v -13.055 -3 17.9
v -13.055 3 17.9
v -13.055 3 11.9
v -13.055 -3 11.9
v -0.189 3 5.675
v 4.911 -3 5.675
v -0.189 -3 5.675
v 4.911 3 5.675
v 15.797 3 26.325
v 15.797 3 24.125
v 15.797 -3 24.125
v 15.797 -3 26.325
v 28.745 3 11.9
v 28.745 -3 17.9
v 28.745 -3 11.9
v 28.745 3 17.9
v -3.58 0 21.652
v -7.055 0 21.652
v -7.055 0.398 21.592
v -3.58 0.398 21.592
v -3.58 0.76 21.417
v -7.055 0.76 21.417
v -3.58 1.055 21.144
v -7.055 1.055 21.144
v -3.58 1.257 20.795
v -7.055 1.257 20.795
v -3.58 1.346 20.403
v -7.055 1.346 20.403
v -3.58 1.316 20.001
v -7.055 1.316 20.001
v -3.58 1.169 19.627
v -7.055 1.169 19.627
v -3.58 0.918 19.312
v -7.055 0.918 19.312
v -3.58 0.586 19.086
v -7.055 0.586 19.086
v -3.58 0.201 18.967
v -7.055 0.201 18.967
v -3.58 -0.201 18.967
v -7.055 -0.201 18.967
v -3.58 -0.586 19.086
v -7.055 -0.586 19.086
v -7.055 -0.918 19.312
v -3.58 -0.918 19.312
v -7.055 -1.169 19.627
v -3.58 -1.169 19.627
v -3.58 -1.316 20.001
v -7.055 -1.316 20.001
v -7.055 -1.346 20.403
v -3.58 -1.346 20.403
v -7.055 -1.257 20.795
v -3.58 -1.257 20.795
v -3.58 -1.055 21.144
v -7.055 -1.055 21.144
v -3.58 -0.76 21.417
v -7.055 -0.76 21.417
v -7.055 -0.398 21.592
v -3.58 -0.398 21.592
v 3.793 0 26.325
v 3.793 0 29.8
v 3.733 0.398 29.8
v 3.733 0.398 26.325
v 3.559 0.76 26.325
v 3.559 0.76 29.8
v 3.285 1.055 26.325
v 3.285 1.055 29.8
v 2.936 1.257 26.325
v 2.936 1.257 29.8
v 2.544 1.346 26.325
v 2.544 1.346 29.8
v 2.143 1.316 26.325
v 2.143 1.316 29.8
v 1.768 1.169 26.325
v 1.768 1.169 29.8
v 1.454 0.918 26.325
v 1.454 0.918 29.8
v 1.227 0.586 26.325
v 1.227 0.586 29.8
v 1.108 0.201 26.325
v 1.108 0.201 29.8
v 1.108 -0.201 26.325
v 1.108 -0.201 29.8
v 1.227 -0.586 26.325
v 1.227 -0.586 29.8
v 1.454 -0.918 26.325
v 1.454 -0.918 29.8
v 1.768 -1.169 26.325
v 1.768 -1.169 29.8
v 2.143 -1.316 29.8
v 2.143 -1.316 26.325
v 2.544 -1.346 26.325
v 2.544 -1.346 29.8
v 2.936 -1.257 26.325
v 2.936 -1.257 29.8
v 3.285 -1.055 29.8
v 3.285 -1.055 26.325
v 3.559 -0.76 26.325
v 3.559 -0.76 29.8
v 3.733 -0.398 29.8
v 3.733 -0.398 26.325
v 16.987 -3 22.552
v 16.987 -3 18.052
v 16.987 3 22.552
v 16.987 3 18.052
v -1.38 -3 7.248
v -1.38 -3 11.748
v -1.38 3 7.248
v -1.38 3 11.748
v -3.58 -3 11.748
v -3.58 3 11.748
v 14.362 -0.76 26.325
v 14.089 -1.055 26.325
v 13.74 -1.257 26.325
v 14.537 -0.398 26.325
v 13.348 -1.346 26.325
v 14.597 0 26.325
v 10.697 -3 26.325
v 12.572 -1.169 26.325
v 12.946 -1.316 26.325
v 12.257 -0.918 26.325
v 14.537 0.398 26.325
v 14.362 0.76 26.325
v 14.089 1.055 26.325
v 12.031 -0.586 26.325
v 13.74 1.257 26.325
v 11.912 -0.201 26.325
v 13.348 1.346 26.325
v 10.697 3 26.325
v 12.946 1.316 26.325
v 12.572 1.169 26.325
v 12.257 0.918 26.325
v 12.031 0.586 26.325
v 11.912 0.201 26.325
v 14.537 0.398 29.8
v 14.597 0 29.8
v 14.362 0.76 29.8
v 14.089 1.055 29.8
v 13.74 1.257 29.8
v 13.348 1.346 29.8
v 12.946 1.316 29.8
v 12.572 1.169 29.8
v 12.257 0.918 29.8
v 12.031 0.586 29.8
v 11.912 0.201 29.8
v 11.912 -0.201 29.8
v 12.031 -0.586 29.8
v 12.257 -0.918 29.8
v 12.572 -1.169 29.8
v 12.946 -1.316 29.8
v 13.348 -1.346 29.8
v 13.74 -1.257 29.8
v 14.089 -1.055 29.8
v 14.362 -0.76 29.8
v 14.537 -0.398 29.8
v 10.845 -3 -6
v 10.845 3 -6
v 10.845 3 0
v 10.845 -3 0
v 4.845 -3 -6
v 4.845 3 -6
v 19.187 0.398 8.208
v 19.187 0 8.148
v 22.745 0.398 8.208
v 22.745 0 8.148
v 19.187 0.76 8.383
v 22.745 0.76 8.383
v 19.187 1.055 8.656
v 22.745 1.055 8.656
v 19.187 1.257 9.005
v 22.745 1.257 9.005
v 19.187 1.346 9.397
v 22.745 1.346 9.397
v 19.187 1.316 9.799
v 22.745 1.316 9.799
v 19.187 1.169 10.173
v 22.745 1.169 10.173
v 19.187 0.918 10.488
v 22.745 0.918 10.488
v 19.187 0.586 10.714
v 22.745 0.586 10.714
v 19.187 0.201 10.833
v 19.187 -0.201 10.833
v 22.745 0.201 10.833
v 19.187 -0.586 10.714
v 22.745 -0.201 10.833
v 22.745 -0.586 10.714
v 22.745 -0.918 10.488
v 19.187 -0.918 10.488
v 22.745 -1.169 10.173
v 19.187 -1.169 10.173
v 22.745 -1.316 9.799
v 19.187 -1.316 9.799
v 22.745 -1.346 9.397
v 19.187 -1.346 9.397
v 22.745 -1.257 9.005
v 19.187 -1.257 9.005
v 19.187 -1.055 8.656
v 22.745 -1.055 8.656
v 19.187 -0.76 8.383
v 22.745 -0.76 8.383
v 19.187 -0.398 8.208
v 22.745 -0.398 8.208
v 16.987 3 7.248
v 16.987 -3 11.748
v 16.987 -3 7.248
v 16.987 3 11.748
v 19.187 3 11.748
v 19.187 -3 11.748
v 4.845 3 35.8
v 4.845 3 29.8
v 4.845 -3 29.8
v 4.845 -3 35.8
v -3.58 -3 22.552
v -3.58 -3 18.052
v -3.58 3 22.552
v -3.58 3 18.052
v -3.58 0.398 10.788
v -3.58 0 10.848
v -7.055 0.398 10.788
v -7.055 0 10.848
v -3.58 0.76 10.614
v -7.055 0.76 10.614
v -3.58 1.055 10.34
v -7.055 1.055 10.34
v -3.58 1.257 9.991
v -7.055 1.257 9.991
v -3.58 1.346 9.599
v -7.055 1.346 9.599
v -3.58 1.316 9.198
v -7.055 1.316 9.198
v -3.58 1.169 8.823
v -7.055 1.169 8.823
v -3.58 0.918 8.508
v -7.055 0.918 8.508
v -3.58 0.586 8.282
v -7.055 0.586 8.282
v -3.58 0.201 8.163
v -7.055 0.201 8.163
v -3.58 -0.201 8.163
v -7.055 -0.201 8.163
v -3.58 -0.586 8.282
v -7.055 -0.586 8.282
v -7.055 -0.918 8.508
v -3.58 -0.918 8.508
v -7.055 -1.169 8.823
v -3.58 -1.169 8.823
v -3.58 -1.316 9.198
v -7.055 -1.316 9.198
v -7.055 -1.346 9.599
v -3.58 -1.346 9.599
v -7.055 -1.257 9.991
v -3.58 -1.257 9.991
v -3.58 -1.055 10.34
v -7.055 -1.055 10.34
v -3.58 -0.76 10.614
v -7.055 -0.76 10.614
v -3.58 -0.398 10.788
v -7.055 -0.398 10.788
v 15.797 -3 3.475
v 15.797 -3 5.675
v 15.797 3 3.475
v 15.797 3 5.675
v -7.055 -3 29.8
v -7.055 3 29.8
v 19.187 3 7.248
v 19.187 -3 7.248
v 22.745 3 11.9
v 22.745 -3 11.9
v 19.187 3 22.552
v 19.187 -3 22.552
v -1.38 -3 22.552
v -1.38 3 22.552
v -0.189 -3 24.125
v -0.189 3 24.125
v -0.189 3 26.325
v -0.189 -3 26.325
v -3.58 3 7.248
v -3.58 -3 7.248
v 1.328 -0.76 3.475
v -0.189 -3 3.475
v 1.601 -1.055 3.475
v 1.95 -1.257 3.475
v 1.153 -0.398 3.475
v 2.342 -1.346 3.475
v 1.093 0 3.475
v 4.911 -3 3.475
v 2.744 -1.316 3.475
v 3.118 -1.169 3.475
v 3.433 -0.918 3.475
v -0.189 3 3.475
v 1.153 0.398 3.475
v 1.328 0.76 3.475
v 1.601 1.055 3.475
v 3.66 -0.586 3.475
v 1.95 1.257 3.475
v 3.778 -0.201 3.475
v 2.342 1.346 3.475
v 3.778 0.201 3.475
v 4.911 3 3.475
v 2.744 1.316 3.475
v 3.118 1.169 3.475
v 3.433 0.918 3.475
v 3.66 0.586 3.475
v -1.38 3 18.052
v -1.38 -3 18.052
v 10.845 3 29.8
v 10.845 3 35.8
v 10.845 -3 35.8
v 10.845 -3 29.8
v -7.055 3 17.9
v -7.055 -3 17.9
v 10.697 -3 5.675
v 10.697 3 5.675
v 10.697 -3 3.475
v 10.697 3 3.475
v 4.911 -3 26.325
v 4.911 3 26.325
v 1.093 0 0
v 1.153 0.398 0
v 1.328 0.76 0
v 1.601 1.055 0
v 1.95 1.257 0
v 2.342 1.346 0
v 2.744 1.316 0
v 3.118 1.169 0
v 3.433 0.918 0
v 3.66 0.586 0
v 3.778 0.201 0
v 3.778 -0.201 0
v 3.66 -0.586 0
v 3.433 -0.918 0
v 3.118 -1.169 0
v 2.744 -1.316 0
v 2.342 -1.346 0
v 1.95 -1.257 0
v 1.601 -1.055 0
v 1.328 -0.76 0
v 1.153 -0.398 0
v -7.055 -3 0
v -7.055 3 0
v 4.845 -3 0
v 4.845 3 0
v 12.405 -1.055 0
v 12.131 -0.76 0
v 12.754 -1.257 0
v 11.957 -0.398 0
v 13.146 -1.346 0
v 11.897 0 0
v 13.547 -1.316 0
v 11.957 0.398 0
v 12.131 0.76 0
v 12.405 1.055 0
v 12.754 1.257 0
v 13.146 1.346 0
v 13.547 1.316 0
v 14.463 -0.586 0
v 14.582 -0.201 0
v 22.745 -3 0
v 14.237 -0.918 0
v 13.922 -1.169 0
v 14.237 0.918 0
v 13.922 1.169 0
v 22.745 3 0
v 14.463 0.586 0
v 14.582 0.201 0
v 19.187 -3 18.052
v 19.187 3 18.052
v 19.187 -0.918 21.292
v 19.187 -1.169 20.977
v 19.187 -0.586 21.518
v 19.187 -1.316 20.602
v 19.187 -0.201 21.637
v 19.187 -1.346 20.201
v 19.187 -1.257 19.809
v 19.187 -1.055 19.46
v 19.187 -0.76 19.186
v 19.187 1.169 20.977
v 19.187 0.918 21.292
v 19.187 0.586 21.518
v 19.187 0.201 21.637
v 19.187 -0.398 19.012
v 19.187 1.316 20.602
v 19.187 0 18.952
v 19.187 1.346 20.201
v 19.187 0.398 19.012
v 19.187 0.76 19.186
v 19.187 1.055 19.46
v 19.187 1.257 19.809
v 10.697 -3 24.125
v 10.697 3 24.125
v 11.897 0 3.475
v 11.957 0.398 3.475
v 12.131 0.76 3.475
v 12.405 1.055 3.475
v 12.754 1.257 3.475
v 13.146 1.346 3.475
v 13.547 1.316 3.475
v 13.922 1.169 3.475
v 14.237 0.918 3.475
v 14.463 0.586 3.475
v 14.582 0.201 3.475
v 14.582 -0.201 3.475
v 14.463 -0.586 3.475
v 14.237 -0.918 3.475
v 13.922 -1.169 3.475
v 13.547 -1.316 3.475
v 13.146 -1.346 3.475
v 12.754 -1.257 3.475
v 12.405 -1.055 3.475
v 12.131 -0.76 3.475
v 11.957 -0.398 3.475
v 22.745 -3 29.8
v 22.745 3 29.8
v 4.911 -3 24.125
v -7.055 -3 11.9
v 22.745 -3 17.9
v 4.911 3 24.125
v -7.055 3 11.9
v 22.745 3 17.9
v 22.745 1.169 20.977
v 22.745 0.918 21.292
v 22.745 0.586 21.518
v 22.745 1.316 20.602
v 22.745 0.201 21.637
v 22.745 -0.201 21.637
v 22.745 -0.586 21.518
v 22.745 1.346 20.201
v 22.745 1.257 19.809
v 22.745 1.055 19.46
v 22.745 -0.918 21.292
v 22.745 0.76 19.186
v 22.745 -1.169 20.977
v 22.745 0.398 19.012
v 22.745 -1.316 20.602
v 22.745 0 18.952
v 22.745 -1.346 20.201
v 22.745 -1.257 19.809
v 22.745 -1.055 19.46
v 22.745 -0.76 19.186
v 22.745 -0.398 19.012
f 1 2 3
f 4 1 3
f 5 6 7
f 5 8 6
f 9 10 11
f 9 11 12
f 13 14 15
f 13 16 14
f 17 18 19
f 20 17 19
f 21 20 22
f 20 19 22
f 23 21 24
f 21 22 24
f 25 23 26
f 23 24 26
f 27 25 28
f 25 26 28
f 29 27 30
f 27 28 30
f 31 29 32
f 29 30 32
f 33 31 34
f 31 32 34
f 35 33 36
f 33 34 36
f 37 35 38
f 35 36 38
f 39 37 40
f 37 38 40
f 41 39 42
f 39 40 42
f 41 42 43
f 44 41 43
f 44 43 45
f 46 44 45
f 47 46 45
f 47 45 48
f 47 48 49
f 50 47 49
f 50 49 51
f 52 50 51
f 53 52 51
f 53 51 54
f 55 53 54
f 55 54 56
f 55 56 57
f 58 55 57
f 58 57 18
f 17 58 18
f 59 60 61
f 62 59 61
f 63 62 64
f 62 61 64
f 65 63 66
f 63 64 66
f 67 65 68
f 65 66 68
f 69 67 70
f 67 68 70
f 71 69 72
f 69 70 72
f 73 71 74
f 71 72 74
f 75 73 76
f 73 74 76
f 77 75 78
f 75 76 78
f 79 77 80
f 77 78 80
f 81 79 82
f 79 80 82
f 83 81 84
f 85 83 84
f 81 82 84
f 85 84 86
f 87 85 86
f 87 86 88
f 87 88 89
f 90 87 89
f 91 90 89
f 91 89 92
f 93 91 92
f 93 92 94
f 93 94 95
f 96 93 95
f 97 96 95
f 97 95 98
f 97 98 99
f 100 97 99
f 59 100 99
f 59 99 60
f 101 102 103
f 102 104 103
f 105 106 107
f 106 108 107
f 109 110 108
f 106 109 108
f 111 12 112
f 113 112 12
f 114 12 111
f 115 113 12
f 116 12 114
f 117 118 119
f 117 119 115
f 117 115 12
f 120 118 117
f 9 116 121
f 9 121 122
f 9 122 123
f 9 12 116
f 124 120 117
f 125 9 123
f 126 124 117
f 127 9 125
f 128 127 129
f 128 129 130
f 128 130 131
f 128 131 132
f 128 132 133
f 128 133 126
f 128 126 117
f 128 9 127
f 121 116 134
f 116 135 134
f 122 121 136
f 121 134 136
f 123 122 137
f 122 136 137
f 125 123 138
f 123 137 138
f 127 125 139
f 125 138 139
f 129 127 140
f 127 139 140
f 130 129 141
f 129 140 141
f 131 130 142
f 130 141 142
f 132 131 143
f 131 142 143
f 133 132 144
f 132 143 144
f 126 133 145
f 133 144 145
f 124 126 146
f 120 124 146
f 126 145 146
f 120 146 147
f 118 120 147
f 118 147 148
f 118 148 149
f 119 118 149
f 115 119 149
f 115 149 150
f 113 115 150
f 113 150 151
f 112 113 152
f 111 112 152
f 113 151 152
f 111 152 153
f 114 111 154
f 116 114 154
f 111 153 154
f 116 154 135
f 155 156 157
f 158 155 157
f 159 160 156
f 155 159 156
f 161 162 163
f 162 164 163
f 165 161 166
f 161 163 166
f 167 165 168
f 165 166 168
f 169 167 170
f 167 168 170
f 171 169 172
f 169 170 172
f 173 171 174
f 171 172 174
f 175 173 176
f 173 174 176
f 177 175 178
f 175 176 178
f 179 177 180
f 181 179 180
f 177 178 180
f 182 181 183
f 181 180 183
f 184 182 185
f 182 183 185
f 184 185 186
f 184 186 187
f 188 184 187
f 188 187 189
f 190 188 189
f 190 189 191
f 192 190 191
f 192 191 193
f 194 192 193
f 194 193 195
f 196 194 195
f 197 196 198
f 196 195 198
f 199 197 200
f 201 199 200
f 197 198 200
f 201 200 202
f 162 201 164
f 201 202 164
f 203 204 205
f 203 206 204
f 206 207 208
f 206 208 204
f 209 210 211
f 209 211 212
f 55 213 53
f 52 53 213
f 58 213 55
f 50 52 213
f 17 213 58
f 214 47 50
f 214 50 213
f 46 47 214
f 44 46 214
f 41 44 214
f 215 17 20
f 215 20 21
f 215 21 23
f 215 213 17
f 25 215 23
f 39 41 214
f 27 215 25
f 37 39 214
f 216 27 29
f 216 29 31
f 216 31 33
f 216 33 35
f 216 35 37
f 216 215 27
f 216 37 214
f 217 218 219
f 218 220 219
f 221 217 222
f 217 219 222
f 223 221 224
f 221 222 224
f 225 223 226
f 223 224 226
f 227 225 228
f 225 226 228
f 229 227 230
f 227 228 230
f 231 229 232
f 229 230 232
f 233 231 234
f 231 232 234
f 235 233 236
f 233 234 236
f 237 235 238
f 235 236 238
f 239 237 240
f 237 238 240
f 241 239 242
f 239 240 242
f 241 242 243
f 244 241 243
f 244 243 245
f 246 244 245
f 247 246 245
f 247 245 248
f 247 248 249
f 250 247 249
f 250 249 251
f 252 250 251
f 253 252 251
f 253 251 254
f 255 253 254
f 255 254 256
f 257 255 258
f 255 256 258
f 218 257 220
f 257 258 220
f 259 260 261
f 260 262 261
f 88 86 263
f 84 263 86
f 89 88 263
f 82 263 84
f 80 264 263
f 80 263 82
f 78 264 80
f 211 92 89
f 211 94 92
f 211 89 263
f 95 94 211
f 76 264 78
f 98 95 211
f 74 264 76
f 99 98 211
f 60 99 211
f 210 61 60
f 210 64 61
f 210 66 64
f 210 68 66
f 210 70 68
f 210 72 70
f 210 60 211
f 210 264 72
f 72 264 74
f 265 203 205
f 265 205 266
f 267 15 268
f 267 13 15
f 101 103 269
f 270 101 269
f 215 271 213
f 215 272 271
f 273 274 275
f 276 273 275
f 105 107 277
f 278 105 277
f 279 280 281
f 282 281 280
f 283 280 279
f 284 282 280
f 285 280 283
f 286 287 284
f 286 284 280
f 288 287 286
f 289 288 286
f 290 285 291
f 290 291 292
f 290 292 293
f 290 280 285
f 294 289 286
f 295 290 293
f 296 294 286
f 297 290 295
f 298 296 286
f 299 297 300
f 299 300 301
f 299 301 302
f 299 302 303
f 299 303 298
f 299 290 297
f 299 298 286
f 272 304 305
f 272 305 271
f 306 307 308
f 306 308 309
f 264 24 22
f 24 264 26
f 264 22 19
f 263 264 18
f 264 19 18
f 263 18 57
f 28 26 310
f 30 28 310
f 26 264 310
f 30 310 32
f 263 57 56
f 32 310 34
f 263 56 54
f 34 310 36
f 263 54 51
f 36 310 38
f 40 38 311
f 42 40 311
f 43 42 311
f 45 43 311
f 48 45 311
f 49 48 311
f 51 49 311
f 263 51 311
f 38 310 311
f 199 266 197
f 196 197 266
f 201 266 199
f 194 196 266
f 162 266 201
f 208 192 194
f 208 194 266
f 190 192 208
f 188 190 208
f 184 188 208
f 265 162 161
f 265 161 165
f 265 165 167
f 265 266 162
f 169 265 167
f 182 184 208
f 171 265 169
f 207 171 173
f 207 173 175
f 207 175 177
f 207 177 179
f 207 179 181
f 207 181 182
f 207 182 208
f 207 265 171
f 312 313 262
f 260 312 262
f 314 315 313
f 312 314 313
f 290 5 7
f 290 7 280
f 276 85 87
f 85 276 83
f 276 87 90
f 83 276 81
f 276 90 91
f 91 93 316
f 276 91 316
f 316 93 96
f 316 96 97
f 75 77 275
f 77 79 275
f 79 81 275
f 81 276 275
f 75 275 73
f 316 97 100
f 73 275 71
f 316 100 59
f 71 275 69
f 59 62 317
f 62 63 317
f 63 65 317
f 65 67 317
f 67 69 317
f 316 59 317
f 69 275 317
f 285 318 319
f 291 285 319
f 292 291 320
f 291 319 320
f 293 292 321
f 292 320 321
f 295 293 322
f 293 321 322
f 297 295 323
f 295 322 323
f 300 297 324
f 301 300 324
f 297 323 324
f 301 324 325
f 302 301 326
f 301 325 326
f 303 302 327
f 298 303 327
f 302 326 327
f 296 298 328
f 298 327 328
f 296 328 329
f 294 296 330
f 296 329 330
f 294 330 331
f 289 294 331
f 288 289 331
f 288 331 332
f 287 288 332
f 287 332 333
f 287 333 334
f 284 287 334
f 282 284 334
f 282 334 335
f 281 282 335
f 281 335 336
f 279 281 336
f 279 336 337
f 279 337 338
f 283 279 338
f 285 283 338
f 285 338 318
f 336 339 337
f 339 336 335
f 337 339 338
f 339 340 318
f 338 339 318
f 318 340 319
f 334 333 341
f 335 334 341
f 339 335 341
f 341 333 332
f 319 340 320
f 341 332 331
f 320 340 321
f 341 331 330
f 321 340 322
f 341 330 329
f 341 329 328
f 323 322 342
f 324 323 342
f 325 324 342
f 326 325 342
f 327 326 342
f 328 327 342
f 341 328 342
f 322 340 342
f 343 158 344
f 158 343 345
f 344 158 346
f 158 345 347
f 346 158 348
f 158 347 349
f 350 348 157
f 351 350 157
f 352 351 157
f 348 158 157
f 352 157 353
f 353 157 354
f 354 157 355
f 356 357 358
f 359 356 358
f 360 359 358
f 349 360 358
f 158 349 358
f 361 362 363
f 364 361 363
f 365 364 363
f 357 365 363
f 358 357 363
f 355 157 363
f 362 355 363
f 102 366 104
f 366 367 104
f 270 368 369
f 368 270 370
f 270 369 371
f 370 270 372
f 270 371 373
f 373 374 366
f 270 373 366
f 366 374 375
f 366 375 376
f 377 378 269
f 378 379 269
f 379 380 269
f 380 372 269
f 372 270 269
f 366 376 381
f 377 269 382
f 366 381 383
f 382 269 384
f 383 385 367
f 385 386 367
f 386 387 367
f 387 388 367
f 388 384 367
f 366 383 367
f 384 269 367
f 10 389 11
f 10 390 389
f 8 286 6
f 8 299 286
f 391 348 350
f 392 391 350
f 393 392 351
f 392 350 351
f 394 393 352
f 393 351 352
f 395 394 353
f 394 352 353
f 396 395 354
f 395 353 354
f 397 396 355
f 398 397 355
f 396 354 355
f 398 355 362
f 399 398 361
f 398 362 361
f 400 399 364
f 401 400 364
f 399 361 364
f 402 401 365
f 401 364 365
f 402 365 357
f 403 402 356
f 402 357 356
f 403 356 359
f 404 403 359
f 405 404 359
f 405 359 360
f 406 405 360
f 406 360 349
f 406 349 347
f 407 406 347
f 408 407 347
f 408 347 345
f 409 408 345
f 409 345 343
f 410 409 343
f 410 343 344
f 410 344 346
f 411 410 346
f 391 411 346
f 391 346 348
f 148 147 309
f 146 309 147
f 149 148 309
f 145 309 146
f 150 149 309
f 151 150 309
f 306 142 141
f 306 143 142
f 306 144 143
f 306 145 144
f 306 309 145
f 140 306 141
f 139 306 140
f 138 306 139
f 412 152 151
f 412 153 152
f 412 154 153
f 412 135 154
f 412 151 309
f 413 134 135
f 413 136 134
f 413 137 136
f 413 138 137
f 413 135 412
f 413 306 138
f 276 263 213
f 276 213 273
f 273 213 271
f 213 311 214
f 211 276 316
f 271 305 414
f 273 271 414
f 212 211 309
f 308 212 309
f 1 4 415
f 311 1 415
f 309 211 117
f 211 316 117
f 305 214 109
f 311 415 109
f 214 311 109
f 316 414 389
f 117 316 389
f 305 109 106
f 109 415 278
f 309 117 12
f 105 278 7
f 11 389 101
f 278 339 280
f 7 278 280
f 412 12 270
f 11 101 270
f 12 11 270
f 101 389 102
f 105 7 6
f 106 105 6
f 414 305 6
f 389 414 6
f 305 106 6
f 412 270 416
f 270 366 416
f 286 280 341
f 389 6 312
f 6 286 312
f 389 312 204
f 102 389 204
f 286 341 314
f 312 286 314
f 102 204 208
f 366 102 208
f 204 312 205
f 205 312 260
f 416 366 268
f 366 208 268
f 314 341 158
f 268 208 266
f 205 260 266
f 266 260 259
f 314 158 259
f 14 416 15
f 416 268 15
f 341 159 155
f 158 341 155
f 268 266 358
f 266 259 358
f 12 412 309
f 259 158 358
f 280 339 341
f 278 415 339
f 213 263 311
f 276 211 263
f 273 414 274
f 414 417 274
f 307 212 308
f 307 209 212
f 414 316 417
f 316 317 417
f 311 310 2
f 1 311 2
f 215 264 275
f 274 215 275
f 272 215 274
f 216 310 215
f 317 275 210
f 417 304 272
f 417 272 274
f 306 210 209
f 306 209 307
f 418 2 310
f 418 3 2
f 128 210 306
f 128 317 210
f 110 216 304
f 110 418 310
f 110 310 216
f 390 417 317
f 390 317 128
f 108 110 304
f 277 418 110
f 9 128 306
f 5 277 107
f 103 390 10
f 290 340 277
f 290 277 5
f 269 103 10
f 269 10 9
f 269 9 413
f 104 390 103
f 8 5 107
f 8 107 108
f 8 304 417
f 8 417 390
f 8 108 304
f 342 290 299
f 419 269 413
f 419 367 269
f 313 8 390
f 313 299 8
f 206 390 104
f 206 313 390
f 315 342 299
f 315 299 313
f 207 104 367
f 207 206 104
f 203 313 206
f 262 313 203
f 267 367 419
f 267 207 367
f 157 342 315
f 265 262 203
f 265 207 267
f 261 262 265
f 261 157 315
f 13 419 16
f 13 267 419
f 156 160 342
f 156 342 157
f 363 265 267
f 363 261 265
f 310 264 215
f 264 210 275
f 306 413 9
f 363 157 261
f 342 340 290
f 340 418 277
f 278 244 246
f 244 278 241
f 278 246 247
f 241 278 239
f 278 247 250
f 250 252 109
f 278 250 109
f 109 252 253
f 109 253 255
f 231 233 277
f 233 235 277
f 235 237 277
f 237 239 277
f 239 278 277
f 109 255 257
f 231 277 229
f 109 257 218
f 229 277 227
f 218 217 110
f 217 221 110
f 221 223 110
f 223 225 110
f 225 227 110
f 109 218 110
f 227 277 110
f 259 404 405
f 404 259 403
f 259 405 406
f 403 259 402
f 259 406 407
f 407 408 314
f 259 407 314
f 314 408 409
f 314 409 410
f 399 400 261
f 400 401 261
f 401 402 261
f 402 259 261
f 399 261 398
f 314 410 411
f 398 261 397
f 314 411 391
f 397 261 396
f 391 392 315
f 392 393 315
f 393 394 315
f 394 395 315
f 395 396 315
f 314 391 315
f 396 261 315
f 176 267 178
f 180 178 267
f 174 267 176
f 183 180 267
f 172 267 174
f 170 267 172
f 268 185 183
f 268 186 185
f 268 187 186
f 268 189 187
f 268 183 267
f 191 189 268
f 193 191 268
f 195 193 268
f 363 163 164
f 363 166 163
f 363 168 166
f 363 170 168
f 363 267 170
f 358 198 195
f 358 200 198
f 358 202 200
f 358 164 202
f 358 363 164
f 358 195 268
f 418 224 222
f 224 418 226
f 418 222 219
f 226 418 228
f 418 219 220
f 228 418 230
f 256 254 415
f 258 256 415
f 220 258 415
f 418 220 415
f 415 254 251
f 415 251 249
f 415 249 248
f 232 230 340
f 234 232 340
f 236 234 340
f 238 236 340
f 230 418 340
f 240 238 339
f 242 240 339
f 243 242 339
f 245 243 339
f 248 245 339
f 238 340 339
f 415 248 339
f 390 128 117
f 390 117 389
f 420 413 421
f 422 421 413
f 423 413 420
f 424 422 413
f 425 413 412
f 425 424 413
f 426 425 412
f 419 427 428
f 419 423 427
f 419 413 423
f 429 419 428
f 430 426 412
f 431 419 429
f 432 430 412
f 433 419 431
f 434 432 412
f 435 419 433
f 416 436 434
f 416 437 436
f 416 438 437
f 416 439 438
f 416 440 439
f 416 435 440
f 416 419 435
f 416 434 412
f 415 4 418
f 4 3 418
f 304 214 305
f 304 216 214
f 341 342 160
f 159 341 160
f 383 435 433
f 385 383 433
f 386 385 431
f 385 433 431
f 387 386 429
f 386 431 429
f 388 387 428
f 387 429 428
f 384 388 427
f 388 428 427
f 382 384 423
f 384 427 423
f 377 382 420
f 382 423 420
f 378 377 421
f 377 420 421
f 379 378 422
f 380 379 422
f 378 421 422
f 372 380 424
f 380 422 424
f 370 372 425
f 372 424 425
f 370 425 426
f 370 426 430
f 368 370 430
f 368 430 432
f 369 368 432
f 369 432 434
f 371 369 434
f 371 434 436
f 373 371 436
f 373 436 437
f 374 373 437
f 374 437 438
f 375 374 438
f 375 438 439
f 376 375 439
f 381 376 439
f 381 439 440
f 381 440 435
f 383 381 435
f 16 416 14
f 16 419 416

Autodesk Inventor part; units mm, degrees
ref_plane "YZ Plane" through (0, 0, 0) normal (1, 0, 0) x (0, 1, 0)
ref_plane "XZ Plane" through (0, 0, 0) normal (0, 1, 0) x (-1, 0, 0)
sketch "스케치1" plane through (0, 0, 0) normal (0, 0, 1) x (1, 0, 0)
  arc A0 (-4.555, 20.4) -> (-1.5118, 17.2038) centre (-1.355, 20.4) ccw projected
  line L0 (-4.555, 20.4) -> (-4.555, 29.4) projected
  line L1 (-4.555, 29.4) -> (-9.955, 29.4) projected
  line L2 (-9.955, 29.4) -> (-9.955, 17.8) projected
  line L3 (-9.955, 17.8) -> (-4.855, 11.8) projected
  line L4 (-4.855, 11.8) -> (-4.7625, 11.8) projected
  line L5 (-4.7625, 11.8) -> (-4.7625, -3) projected
  line L6 (-4.7625, -3) -> (3.7037, -3) projected
  arc A1 (4.7037, -2) -> (3.7037, -3) centre (4.7037, -3) ccw projected
  line L7 (4.7037, -2) -> (4.7037, 2.1) projected
  arc A2 (5.6987, 3) -> (4.7037, 2.1) centre (4.7037, 3.1) ccw projected
  line L8 (5.6987, 3) -> (9.9088, 3) projected
  arc A3 (10.9037, 2.1) -> (9.9088, 3) centre (10.9037, 3.1) ccw projected
  line L9 (10.9037, 2.1) -> (10.9037, -2) projected
  arc A4 (11.9037, -3) -> (10.9037, -2) centre (10.9037, -3) ccw projected
  line L10 (11.9037, -3) -> (20.4525, -3) projected
  line L11 (20.4525, -3) -> (20.4525, 11.8) projected
  line L12 (20.4525, 11.8) -> (20.545, 11.8) projected
  line L13 (20.545, 11.8) -> (25.645, 17.8) projected
  line L14 (25.645, 17.8) -> (25.645, 29.4) projected
  line L15 (25.645, 29.4) -> (20.245, 29.4) projected
  line L16 (20.245, 29.4) -> (20.245, 20.4) projected
  arc A5 (17.2018, 17.2038) -> (20.245, 20.4) centre (17.045, 20.4) ccw projected
  line L17 (17.2018, 17.2038) -> (-1.5118, 17.2038) projected
  circle A6 centre (13.2469, 0) radius 1.35 projected
  circle A7 centre (2.4432, 0) radius 1.35 projected
  circle A8 centre (18.0506, 0) radius 1.35 projected
  circle A9 centre (-2.3606, 0) radius 1.35 projected
  circle A10 centre (-7.155, 20.9) radius 1.35 projected
  circle A11 centre (-0.655, 14.6) radius 1.35 projected
  circle A12 centre (16.345, 14.6) radius 1.35 projected
  circle A13 centre (22.845, 20.9) radius 1.35 projected
  line L18 (20.4525, -3) -> (-4.855, -3)
  line L19 (-4.855, -3) -> (-4.855, 3)
  line L20 (-4.855, 3) -> (20.4525, 3)
  line L21 (20.4525, 3) -> (20.4525, -3)
  line L22 (22.845, 3) -> (22.845, -11.8) projected
  line L23 (-7.155, 3) -> (-7.155, -11.8) projected
  line L24 (22.745, 3) -> (22.745, -11.8)
  line L25 (-7.055, 3) -> (-7.055, -11.8)
  line L26 (22.745, -3) -> (-7.055, -3)
  line L27 (-7.055, -3) -> (-7.055, 3)
  line L28 (-7.055, 3) -> (22.745, 3)
  line L29 (22.745, 3) -> (22.745, -3)
  point P0 (0, 0)
  point P1 (11.8625, -3)
  point P2 (20.4525, 3)
  point P3 (9.8675, 3)
  point P4 (5.6574, 3)
  point P5 (-4.7625, 3)
  point P6 (3.6625, -3)
  point P7 (-4.855, 3)
  point P8 (-7.055, -3)
  point P9 (-4.855, -3)
  point P10 (-4.7625, -3)
  point P11 (22.745, 1.2049)
  point P12 (20.4525, 3)
  point P13 (20.4525, -3)
  point P14 (11.8987, 3)
  point P15 (3.7037, -3)
  point P16 (11.9037, -3)
  point P17 (5.6987, 3)
  point P18 (3.7088, 3)
  point P19 (5.6987, 3)
  point P20 (11.9037, -3)
  point P21 (-4.7625, 3)
  point P22 (-4.855, -3)
  point P23 (10.9037, -1.792)
  point P24 (-4.7625, -3)
  point P25 (4.7037, -1.792)
  dimension "d7" = 0.1
  dimension "d8" = 0.1
extrude "돌출1" add sketch "스케치1" along normal blind 29.8 contours L20 A2 L7 A1 L6 L5 | L5 L18 L19 L20 | L19 L26 L25 L28 | L20 L8 A3 L9 A4 L18 A1 L7 A2 | L28 L24 L26 L11 | L11 L10 A4 L9 A3 L20 | A6 | A7 | A8 | A9
ref_plane "작업 평면4" through (10.8037, 3, 0) normal (0, 1, 0) x (1, 0, 0)
sketch "스케치5" plane through (10.8037, 3, 0) normal (0, 1, 0) x (1, 0, 0)
  line L0 (1.1931, -3.675) -> (1.1931, 6)
  line L1 (3.6931, -3.675) -> (3.6931, 6)
  line L2 (1.1931, -5.675) -> (3.6931, -5.675)
  line L3 (2.4431, 0) -> (2.4431, -3.675)
  line L4 (2.4431, -5.675) -> (2.4431, -4.575)
  line L5 (2.4431, -4.575) -> (2.4431, -3.475)
  line L6 (2.4431, -3.475) -> (-0.1069, -3.475)
  line L7 (2.4431, -3.475) -> (4.9931, -3.475)
  line L8 (4.9931, -3.475) -> (-0.1069, -3.475)
  line L9 (-0.1069, -3.475) -> (-0.1069, -5.675)
  line L10 (-0.1069, -5.675) -> (4.9931, -5.675)
  line L11 (4.9931, -5.675) -> (4.9931, -3.475)
  line L12 (1.1931, -5.675) -> (1.1931, 6)
  line L13 (3.6931, -5.675) -> (3.6931, 6)
  line L14 (1.1931, -5.675) -> (3.6931, -5.675)
  line L15 (2.4431, -3.675) -> (2.4431, -5.675)
  line L16 (-23.9, -14.9) -> (17.9, -14.9)
  line L17 (1.1931, -24.125) -> (3.6931, -24.125)
  line L18 (2.4431, -24.125) -> (2.4431, -25.225)
  line L19 (2.4431, -25.225) -> (2.4431, -26.325)
  line L20 (2.4431, -26.325) -> (-0.1069, -26.325)
  line L21 (2.4431, -26.325) -> (4.9931, -26.325)
  line L22 (4.9931, -26.325) -> (-0.1069, -26.325)
  line L23 (-0.1069, -26.325) -> (-0.1069, -24.125)
  line L24 (-0.1069, -24.125) -> (4.9931, -24.125)
  line L25 (4.9931, -24.125) -> (4.9931, -26.325)
  line L26 (1.1931, -24.125) -> (3.6931, -24.125)
  line L27 (2.4431, -26.125) -> (2.4431, -24.125)
  line L28 (-3, -14.9) -> (-3, -22)
  line L29 (-7.1931, -5.675) -> (-9.6931, -5.675)
  line L30 (-8.4431, -5.675) -> (-8.4431, -4.575)
  line L31 (-8.4431, -4.575) -> (-8.4431, -3.475)
  line L32 (-8.4431, -3.475) -> (-5.8931, -3.475)
  line L33 (-8.4431, -3.475) -> (-10.9931, -3.475)
  line L34 (-10.9931, -3.475) -> (-5.8931, -3.475)
  line L35 (-5.8931, -3.475) -> (-5.8931, -5.675)
  line L36 (-5.8931, -5.675) -> (-10.9931, -5.675)
  line L37 (-10.9931, -5.675) -> (-10.9931, -3.475)
  line L38 (-7.1931, -5.675) -> (-9.6931, -5.675)
  line L39 (-8.4431, -3.675) -> (-8.4431, -5.675)
  line L40 (-7.1931, -24.125) -> (-9.6931, -24.125)
  line L41 (-8.4431, -24.125) -> (-8.4431, -25.225)
  line L42 (-8.4431, -25.225) -> (-8.4431, -26.325)
  line L43 (-7.1931, -24.125) -> (-9.6931, -24.125)
  line L44 (-8.4431, -26.125) -> (-8.4431, -24.125)
  line L45 (-8.4431, -26.325) -> (-10.9931, -26.325)
  line L46 (-10.9931, -24.125) -> (-10.9931, -26.325)
  line L47 (-8.4431, -26.325) -> (-5.8931, -26.325)
  line L48 (-5.8931, -26.325) -> (-5.8931, -24.125)
  line L49 (-10.9931, -26.325) -> (-5.8931, -26.325)
  line L50 (-5.8931, -24.125) -> (-10.9931, -24.125)
  line L51 (-12.1837, -21.5519) -> (-23.8587, -21.5519)
  line L52 (-12.1837, -19.0519) -> (-23.8587, -19.0519)
  line L53 (-12.1837, -19.0519) -> (-12.1837, -21.5519)
  line L54 (-12.1837, -19.0519) -> (-14.3837, -19.0519)
  line L55 (-12.1837, -20.3019) -> (-12.1837, -18.0519)
  line L56 (-12.1837, -20.3019) -> (-12.1837, -22.5519)
  line L57 (-14.3837, -18.0519) -> (-12.1837, -18.0519)
  line L58 (-12.1837, -18.0519) -> (-12.1837, -22.5519)
  line L59 (-12.1837, -22.5519) -> (-14.3837, -22.5519)
  line L60 (-14.3837, -22.5519) -> (-14.3837, -18.0519)
  line L61 (-12.1837, -10.7481) -> (-12.1837, -8.2481)
  line L62 (-12.1837, -10.7481) -> (-14.3837, -10.7481)
  line L63 (-12.1837, -9.4981) -> (-12.1837, -11.7481)
  line L64 (-12.1837, -9.4981) -> (-12.1837, -7.2481)
  line L65 (-14.3837, -11.7481) -> (-12.1837, -11.7481)
  line L66 (-12.1837, -11.7481) -> (-12.1837, -7.2481)
  line L67 (-12.1837, -7.2481) -> (-14.3837, -7.2481)
  line L68 (-14.3837, -7.2481) -> (-14.3837, -11.7481)
  line L69 (6.1837, -19.0519) -> (6.1837, -21.5519)
  line L70 (6.1837, -19.0519) -> (8.3837, -19.0519)
  line L71 (6.1837, -20.3019) -> (6.1837, -18.0519)
  line L72 (6.1837, -20.3019) -> (6.1837, -22.5519)
  line L73 (8.3837, -18.0519) -> (6.1837, -18.0519)
  line L74 (6.1837, -18.0519) -> (6.1837, -22.5519)
  line L75 (6.1837, -22.5519) -> (8.3837, -22.5519)
  line L76 (8.3837, -22.5519) -> (8.3837, -18.0519)
  line L77 (6.1837, -9.4981) -> (6.1837, -7.2481)
  line L78 (6.1837, -7.2481) -> (8.3837, -7.2481)
  line L79 (6.1837, -10.7481) -> (6.1837, -8.2481)
  line L80 (6.1837, -9.4981) -> (6.1837, -11.7481)
  line L81 (6.1837, -10.7481) -> (8.3837, -10.7481)
  line L82 (8.3837, -11.7481) -> (6.1837, -11.7481)
  line L83 (8.3837, -7.2481) -> (8.3837, -11.7481)
  line L84 (6.1837, -11.7481) -> (6.1837, -7.2481)
  point P0 (-0.1069, -3.475)
  point P1 (1.1931, -26.125)
  point P2 (3.6931, -26.125)
  point P3 (-7.1931, -3.675)
  point P4 (-9.6931, -3.675)
  point P5 (-7.1931, -26.125)
  point P6 (-9.6931, -26.125)
  point P7 (-0.1069, -26.325)
  point P8 (3.6931, -24.125)
  point P9 (1.1931, -24.125)
  dimension "d24" = 1.1
  dimension "d25" = 1.1
  dimension "d26" = 2.55
  dimension "d27" = 2.55
  dimension "d28" = 2.2
  dimension "d29" = 2.25
  dimension "d30" = 2.25
extrude "돌출4" cut sketch "스케치5" against normal blind 6
sketch "스케치6" plane through (-7.055, -3, 29.8) normal (-1, 0, 0) x (0, 0, 1)
  circle A0 centre (-9.4981, 3) radius 1.35 projected
  circle A1 centre (-20.3019, 3) radius 1.35 projected
  point P0 (-29.8, 3)
extrude "돌출5" cut sketch "스케치6" against normal up to next
sketch "스케치7" plane through (0, 0, 0) normal (0, 0, -1) x (-1, 0, 0)
  circle A0 centre (-13.2469, 0) radius 1.35 projected
  circle A1 centre (-2.4432, 0) radius 1.35 projected
  point P0 (0, 0)
extrude "돌출6" cut sketch "스케치7" against normal up to next
sketch "스케치8" plane through (22.745, -3, 0) normal (1, 0, 0) x (0, 0, -1)
  circle A0 centre (-20.3019, 3) radius 1.35 projected
  circle A1 centre (-9.4981, 3) radius 1.35 projected
  point P0 (0, 3)
extrude "돌출7" cut sketch "스케치8" against normal up to next
sketch "스케치9" plane through (0, 0, 29.8) normal (0, 0, 1) x (1, 0, 0)
  circle A0 centre (2.4432, 0) radius 1.35 projected
  circle A1 centre (13.2469, 0) radius 1.35 projected
  point P0 (0, 0)
extrude "돌출8" cut sketch "스케치9" against normal up to next
sketch "스케치10" plane through (-7.055, 3, 0) normal (0, 1, 0) x (1, 0, 0)
  line L0 (24.0424, -18.0519) -> (26.2424, -18.0519) projected
  line L1 (26.2424, -18.0519) -> (26.2424, -22.5519) projected
  line L2 (26.2424, -22.5519) -> (24.0424, -22.5519) projected
  line L3 (24.0424, -22.5519) -> (24.0424, -18.0519) projected
  line L4 (11.9656, -3.475) -> (11.9656, -5.675) projected
  line L5 (11.9656, -5.675) -> (6.8656, -5.675) projected
  line L6 (6.8656, -5.675) -> (6.8656, -3.475) projected
  line L7 (6.8656, -3.475) -> (11.9656, -3.475) projected
  line L8 (11.9656, -24.125) -> (11.9656, -26.325) projected
  line L9 (11.9656, -26.325) -> (6.8656, -26.325) projected
  line L10 (6.8656, -26.325) -> (6.8656, -24.125) projected
  line L11 (6.8656, -24.125) -> (11.9656, -24.125) projected
  line L12 (3.475, -7.2481) -> (5.675, -7.2481) projected
  line L13 (5.675, -7.2481) -> (5.675, -11.7481) projected
  line L14 (5.675, -11.7481) -> (3.475, -11.7481) projected
  line L15 (3.475, -11.7481) -> (3.475, -7.2481) projected
  line L16 (26.2424, -11.7481) -> (24.0424, -11.7481) projected
  line L17 (24.0424, -11.7481) -> (24.0424, -7.2481) projected
  line L18 (24.0424, -7.2481) -> (26.2424, -7.2481) projected
  line L19 (26.2424, -7.2481) -> (26.2424, -11.7481) projected
  line L20 (22.8519, -3.475) -> (22.8519, -5.675) projected
  line L21 (22.8519, -5.675) -> (17.7519, -5.675) projected
  line L22 (17.7519, -5.675) -> (17.7519, -3.475) projected
  line L23 (17.7519, -3.475) -> (22.8519, -3.475) projected
  line L24 (22.8519, -24.125) -> (22.8519, -26.325) projected
  line L25 (22.8519, -26.325) -> (17.7519, -26.325) projected
  line L26 (17.7519, -26.325) -> (17.7519, -24.125) projected
  line L27 (17.7519, -24.125) -> (22.8519, -24.125) projected
  line L28 (3.475, -18.0519) -> (5.675, -18.0519) projected
  line L29 (5.675, -18.0519) -> (5.675, -22.5519) projected
  line L30 (5.675, -22.5519) -> (3.475, -22.5519) projected
  line L31 (3.475, -22.5519) -> (3.475, -18.0519) projected
  line L32 (29.8, 0) -> (0, 0) projected
  line L33 (0, 0) -> (0, -29.8) projected
  line L34 (29.8, -29.8) -> (0, -29.8) projected
  line L35 (29.8, 0) -> (29.8, -29.8) projected
  line L36 (0, -14.9) -> (-6, -14.9)
  line L37 (-6, -14.9) -> (-6, -11.9)
  line L38 (-6, -11.9) -> (0, -11.9)
  line L39 (0, -11.9) -> (0, -17.9)
  line L40 (0, -17.9) -> (-6, -17.9)
  line L41 (-6, -17.9) -> (-6, -11.9)
  line L42 (14.9, 0) -> (14.9, -2)
  line L43 (29.8, -14.9) -> (35.8, -14.9)
  line L44 (35.8, -14.9) -> (35.8, -11.9)
  line L45 (35.8, -11.9) -> (29.8, -11.9)
  line L46 (29.8, -11.9) -> (29.8, -17.9)
  line L47 (29.8, -17.9) -> (35.8, -17.9)
  line L48 (35.8, -17.9) -> (35.8, -11.9)
  line L49 (14.9, 0) -> (14.9, 3)
  line L50 (14.9, 3) -> (14.9, 6)
  line L51 (14.9, 6) -> (11.9, 6)
  line L52 (11.9, 6) -> (17.9, 6)
  line L53 (17.9, 6) -> (17.9, 0)
  line L54 (17.9, 0) -> (11.9, 0)
  line L55 (11.9, 0) -> (11.9, 6)
  line L56 (14.9, -29.8) -> (14.9, -32.8)
  line L57 (14.9, -32.8) -> (14.9, -35.8)
  line L58 (14.9, -35.8) -> (11.9, -35.8)
  line L59 (11.9, -35.8) -> (17.9, -35.8)
  line L60 (17.9, -35.8) -> (17.9, -29.8)
  line L61 (17.9, -29.8) -> (11.9, -29.8)
  line L62 (11.9, -29.8) -> (11.9, -35.8)
  point P0 (7.055, 0)
  point P1 (0, -11.9)
  dimension "d39" = 3
  dimension "d40" = 6
  dimension "d41" = 3
  dimension "d42" = 6
extrude "돌출9" add sketch "스케치10" against normal blind 6 contours L32 L49 L50 L52 L53 | L45 L44 L43 L35 | L32 L55 L51 L50 L49 | L43 L48 L47 L35 | L33 L36 L37 L38 | L60 L59 L57 L56 L34 | L33 L40 L41 L36 | L56 L57 L58 L62 L34
properties part number "arm_motor_connect"
